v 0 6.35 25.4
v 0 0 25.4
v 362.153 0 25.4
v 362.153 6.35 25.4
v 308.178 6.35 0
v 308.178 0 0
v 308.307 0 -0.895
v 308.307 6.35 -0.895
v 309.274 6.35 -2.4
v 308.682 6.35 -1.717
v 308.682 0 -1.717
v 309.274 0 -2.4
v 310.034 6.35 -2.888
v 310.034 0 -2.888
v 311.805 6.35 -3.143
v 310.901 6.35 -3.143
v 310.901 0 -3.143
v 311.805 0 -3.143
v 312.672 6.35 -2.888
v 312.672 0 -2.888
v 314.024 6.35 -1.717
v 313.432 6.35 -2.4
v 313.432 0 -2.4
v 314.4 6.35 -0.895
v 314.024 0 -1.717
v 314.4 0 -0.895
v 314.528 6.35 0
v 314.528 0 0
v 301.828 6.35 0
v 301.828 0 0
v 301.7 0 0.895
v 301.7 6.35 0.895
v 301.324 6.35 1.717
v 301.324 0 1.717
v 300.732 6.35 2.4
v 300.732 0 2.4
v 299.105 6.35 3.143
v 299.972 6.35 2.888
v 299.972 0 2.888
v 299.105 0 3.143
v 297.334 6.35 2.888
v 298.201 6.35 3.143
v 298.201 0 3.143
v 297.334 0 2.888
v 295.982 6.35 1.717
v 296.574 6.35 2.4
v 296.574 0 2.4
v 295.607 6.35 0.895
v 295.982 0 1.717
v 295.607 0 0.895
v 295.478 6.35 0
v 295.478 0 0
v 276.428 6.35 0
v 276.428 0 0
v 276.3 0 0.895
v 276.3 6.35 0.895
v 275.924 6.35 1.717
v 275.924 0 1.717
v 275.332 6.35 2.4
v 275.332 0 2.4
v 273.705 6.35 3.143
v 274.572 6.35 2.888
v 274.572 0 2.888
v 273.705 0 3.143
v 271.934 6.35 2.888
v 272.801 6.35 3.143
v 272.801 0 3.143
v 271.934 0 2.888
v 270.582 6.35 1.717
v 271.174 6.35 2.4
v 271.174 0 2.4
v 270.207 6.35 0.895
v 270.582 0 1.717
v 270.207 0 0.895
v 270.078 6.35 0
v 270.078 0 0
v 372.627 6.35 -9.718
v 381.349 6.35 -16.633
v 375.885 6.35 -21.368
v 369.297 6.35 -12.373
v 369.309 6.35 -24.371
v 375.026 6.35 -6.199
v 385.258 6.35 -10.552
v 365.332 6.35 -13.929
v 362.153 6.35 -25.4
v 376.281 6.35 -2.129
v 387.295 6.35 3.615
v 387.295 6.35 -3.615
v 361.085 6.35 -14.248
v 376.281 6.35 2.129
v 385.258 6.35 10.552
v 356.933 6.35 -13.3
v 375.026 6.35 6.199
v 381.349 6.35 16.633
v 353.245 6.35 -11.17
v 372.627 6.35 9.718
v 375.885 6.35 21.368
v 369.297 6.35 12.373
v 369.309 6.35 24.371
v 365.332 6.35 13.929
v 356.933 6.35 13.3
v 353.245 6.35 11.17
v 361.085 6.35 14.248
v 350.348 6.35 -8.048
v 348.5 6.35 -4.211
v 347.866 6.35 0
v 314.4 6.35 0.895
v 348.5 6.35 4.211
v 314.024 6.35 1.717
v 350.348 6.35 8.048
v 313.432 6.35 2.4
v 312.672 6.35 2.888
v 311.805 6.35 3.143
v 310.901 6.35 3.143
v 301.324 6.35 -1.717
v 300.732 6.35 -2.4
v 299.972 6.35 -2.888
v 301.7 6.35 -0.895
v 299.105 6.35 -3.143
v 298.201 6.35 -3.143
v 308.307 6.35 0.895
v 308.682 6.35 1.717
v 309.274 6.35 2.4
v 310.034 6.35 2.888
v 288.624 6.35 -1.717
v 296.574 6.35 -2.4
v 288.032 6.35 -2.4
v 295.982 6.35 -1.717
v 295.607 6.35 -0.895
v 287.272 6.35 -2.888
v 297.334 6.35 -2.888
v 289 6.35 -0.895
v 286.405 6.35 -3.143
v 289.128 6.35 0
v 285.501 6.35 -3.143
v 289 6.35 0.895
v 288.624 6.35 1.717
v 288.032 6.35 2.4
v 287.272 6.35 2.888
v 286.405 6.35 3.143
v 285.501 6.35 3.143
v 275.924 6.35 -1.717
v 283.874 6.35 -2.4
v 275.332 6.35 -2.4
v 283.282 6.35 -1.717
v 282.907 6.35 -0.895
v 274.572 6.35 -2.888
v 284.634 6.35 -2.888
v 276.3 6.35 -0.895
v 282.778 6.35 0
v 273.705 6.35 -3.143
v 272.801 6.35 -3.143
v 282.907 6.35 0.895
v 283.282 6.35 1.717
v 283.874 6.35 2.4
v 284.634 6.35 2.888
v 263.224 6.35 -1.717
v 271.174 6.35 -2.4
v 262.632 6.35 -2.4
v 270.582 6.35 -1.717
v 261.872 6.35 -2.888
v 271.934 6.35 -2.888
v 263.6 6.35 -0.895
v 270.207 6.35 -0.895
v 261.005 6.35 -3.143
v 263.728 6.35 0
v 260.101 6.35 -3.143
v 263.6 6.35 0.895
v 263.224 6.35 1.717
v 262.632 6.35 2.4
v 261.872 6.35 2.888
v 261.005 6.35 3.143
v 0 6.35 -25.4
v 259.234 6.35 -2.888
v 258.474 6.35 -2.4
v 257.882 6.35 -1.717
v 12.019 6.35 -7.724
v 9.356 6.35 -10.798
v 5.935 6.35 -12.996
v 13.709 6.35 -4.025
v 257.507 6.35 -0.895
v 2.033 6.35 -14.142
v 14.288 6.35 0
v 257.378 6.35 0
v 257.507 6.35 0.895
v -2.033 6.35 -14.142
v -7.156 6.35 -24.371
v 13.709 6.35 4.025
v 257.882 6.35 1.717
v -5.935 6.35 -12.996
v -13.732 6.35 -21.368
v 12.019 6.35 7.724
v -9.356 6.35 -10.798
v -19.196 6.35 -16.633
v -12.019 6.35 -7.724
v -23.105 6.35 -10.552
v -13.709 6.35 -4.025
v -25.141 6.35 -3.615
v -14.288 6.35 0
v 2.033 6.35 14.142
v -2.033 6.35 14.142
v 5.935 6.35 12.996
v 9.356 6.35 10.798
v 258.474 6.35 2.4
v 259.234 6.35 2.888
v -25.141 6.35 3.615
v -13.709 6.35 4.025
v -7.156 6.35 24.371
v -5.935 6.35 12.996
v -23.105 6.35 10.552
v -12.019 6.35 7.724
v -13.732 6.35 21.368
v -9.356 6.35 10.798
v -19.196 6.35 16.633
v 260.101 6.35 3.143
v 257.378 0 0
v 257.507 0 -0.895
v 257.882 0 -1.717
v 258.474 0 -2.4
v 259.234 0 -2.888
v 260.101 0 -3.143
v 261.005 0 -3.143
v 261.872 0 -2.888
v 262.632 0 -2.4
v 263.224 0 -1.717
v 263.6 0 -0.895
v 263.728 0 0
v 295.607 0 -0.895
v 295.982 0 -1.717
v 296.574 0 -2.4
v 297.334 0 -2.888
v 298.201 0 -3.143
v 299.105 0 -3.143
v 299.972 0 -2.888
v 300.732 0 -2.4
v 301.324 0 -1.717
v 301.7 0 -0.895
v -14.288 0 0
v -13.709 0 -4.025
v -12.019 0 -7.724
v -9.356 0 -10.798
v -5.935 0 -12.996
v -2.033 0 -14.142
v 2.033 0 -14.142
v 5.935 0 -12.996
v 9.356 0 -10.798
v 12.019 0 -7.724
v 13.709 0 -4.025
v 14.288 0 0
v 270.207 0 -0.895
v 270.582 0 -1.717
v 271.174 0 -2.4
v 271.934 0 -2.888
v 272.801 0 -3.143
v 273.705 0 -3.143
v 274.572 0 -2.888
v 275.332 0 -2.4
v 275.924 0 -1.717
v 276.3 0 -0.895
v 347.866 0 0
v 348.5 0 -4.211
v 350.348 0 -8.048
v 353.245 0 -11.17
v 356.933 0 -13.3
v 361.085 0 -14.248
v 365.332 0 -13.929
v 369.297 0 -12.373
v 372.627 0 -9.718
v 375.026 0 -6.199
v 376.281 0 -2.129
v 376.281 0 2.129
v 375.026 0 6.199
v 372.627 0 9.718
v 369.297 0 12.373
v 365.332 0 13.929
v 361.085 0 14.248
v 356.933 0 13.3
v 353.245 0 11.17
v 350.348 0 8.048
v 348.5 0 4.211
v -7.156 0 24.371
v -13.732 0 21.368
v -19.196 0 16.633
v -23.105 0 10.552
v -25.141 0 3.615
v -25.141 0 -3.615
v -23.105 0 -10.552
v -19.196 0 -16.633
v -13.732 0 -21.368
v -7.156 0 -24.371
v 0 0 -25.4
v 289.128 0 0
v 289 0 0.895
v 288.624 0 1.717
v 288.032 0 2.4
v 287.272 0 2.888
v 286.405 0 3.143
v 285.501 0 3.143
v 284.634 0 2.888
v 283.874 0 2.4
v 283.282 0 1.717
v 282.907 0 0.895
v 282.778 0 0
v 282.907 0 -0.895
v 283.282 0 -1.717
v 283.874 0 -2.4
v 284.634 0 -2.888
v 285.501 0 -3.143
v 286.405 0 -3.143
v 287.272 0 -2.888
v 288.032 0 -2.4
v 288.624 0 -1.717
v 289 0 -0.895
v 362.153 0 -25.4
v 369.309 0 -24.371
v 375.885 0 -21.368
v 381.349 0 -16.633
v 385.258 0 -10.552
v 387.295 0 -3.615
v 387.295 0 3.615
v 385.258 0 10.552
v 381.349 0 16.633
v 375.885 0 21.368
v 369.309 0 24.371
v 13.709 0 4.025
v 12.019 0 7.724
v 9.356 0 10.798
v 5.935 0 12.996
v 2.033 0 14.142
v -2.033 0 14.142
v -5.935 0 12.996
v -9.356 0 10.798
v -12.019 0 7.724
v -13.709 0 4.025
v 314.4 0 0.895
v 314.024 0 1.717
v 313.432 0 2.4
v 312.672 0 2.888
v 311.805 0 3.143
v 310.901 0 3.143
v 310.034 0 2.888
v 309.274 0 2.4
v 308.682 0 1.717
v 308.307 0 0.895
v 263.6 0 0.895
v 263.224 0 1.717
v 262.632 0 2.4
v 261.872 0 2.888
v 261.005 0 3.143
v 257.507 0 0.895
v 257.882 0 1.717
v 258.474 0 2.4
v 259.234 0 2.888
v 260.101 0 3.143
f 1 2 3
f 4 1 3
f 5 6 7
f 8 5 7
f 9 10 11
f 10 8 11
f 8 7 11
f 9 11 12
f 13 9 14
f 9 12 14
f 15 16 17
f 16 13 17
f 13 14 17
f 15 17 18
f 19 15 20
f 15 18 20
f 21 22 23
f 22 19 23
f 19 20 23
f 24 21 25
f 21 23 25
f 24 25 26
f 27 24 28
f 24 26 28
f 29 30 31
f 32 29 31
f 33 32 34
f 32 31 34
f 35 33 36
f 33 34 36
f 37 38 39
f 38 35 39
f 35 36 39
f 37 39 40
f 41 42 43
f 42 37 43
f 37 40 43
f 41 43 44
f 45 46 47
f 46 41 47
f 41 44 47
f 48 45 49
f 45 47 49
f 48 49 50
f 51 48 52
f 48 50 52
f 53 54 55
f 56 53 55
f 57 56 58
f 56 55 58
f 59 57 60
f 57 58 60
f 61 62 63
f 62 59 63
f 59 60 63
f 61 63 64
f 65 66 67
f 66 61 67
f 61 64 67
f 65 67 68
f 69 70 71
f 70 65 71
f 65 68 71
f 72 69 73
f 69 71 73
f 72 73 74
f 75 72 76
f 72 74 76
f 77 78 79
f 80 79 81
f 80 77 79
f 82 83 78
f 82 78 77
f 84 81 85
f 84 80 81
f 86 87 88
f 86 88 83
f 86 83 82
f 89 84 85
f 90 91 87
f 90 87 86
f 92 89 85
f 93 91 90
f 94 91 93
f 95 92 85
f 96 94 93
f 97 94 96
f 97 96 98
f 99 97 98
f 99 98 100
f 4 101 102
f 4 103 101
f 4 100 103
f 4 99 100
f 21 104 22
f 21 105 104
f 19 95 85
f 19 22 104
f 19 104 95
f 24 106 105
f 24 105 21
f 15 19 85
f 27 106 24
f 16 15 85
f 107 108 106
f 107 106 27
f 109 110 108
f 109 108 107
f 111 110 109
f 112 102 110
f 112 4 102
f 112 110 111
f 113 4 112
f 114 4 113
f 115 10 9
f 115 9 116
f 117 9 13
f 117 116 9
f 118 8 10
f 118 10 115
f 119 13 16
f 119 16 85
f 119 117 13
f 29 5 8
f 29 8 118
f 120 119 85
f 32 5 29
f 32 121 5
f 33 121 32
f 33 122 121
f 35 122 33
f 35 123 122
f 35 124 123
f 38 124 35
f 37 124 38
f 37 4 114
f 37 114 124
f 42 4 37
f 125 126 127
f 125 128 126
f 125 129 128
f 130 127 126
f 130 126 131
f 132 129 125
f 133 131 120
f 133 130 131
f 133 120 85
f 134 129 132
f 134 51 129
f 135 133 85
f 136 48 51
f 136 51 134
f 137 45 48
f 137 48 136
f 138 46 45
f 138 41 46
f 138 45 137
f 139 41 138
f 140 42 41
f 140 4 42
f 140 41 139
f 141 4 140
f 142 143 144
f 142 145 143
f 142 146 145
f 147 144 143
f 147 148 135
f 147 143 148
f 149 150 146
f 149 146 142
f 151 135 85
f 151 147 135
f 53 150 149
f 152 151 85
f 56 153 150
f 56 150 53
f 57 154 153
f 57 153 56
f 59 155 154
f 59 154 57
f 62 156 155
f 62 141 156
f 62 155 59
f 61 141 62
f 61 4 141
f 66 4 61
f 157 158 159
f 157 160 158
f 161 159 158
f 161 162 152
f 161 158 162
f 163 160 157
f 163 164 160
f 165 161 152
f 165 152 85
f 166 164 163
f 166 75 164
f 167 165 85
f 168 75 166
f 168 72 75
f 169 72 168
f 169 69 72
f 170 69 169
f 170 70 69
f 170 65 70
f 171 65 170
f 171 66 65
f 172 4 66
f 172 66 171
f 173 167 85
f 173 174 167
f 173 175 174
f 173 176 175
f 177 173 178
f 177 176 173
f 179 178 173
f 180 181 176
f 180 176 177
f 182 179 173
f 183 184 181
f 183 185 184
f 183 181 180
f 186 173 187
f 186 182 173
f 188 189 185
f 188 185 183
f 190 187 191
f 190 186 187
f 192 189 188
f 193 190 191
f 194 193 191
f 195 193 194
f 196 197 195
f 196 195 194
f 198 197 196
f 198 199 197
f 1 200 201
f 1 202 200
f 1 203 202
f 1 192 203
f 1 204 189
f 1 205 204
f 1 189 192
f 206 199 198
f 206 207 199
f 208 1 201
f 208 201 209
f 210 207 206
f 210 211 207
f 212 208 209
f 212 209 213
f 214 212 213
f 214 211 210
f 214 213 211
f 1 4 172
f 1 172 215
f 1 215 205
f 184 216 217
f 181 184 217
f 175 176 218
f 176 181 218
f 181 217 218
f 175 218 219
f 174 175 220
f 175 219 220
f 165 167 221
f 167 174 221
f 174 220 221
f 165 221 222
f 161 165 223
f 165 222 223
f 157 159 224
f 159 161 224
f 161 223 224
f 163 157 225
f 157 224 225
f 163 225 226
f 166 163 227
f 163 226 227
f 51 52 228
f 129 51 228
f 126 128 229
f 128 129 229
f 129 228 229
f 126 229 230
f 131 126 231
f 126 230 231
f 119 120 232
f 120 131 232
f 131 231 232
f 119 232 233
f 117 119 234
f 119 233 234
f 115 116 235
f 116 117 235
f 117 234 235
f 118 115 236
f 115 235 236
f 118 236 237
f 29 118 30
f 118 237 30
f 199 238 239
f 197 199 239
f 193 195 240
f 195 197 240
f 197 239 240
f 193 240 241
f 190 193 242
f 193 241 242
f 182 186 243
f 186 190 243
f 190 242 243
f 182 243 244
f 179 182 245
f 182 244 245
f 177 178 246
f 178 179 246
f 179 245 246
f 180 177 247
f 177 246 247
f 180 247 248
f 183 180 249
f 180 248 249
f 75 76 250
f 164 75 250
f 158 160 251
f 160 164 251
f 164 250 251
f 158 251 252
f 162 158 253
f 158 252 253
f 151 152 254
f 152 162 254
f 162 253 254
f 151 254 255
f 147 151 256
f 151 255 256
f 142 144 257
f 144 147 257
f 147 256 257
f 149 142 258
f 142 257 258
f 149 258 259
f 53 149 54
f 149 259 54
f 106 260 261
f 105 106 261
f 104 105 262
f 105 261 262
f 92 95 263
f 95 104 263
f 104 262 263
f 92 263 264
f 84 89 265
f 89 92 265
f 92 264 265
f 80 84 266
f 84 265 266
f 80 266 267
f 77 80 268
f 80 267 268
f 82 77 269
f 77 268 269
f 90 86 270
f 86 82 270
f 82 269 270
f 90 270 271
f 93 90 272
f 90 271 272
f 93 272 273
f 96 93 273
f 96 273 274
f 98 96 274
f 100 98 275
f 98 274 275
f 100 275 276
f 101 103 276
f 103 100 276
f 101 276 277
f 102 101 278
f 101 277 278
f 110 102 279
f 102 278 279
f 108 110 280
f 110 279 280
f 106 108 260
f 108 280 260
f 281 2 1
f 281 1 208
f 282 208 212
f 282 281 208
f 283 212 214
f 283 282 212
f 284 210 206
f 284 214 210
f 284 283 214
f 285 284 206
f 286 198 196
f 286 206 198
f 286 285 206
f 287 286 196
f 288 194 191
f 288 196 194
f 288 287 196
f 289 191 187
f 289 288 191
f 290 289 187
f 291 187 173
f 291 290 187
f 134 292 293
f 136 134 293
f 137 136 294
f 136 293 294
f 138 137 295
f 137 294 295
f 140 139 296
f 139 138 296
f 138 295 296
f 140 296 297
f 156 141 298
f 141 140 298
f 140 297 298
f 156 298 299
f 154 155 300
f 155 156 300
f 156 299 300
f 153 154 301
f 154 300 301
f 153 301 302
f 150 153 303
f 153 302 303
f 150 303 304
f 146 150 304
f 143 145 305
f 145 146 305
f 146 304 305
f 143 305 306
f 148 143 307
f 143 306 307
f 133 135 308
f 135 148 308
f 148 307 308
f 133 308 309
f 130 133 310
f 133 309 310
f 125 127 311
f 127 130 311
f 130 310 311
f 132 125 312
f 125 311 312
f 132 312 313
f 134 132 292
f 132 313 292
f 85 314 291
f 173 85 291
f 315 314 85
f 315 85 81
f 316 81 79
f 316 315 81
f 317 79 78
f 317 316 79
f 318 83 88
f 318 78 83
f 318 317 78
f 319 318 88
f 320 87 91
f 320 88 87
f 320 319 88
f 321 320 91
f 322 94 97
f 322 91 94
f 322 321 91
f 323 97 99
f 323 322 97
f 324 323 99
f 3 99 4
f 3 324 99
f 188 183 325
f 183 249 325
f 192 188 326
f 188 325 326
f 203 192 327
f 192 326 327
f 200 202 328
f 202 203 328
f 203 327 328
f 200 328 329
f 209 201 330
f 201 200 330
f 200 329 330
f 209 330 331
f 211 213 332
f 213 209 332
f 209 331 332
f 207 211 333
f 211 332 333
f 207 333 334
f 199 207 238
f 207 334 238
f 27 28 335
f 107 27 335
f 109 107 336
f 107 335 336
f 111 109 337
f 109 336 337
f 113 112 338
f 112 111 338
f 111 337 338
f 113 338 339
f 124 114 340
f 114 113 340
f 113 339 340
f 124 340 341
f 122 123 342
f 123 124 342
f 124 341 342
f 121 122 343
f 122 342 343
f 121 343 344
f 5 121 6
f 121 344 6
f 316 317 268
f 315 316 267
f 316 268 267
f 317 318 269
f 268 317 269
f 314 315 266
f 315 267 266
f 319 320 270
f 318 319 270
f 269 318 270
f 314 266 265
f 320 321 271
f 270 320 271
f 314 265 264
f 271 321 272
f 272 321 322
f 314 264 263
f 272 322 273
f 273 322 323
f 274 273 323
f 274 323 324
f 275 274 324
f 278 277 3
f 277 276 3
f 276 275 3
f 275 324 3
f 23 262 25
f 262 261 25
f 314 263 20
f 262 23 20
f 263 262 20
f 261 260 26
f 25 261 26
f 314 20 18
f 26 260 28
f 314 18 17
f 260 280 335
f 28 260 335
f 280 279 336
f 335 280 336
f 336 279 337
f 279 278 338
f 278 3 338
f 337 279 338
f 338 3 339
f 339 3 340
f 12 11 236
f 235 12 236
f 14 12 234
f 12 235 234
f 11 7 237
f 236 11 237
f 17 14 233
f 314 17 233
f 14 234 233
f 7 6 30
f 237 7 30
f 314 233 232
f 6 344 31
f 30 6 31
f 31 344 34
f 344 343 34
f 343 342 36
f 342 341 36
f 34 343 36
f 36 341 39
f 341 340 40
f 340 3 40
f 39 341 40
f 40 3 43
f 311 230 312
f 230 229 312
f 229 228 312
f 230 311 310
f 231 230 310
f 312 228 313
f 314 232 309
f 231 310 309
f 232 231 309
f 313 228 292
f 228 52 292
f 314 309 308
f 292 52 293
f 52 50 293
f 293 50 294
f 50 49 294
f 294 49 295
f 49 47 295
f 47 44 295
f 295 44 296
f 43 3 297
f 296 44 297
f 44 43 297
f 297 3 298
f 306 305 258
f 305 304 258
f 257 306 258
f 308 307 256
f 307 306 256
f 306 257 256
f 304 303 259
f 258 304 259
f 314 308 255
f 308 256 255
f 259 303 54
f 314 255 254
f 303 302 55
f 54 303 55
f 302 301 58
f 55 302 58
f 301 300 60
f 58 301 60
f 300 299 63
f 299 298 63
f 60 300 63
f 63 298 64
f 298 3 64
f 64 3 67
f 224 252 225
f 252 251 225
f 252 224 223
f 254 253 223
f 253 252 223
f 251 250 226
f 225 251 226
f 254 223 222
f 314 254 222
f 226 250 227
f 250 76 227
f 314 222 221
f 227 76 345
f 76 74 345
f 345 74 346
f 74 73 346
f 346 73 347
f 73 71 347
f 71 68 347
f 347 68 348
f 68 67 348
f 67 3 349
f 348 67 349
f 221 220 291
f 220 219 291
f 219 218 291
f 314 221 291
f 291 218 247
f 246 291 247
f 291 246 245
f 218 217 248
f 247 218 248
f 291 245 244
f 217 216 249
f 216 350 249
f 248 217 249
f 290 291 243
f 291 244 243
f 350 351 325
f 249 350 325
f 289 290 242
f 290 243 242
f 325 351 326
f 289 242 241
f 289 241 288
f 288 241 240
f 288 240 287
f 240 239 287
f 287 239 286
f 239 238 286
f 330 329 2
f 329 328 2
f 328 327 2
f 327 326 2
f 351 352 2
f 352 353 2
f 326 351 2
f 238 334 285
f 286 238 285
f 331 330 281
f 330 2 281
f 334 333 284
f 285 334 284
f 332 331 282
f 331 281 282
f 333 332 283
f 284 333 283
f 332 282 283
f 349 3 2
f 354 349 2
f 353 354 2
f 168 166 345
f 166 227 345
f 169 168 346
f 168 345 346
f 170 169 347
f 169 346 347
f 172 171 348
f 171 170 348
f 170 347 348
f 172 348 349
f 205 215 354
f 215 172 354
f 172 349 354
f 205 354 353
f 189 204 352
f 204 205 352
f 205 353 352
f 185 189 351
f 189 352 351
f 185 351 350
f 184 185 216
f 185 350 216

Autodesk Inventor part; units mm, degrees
ref_plane "YZ Plane" through (0, 0, 0) normal (1, 0, 0) x (0, 1, 0)
ref_plane "XZ Plane" through (0, 0, 0) normal (0, 1, 0) x (-1, 0, 0)
ref_plane "XY Plane" through (0, 0, 0) normal (0, 0, 1) x (1, 0, 0)
sketch "Sketch1" plane through (0, 0, 0) normal (0, 1, 0) x (-1, 0, 0)
  line L0 (0, 0) -> (-362.1532, 0)
  line L1 (0, 0) -> (-362.1532, 0) construction
  line L2 (0, 0) -> (-362.1532, 0) construction
  line L3 (0, 25.4) -> (-362.1532, 25.4)
  line L4 (-362.1532, -25.4) -> (0, -25.4)
  arc A0 (0, -25.4) -> (0, 25.4) centre (0, 0) ccw
  arc A1 (-362.1532, 25.4) -> (-362.1532, -25.4) centre (-362.1532, 0) ccw
  circle A2 centre (0, 0) radius 14.2875
  circle A3 centre (-362.1532, 0) radius 14.2875
  circle A4 centre (-311.3532, 0) radius 3.175
  circle A5 centre (-298.6532, 0) radius 3.175
  circle A6 centre (-285.9532, 0) radius 3.175
  circle A7 centre (-273.2532, 0) radius 3.175
  circle A8 centre (-260.5532, 0) radius 3.175
  point P0 (-181.0766, 0)
  point P1 (-181.0766, 0)
  dimension "d0" = 362.1532
  dimension "d8" = 50.8
  dimension "d9" = 28.575
  dimension "d10" = 28.575
  dimension "d11" = 6.35
  dimension "d12" = 50.8
  dimension "d13" = 6.35
  dimension "d14" = 6.35
  dimension "d15" = 6.35
  dimension "d16" = 6.35
  dimension "d17" = 12.7
  dimension "d18" = 12.7
  dimension "d19" = 12.7
  dimension "d20" = 12.7
extrude "Extrusion1" add sketch "Sketch1" along normal blind 6.35
properties part number "4-bar intake (14.258) bar"
